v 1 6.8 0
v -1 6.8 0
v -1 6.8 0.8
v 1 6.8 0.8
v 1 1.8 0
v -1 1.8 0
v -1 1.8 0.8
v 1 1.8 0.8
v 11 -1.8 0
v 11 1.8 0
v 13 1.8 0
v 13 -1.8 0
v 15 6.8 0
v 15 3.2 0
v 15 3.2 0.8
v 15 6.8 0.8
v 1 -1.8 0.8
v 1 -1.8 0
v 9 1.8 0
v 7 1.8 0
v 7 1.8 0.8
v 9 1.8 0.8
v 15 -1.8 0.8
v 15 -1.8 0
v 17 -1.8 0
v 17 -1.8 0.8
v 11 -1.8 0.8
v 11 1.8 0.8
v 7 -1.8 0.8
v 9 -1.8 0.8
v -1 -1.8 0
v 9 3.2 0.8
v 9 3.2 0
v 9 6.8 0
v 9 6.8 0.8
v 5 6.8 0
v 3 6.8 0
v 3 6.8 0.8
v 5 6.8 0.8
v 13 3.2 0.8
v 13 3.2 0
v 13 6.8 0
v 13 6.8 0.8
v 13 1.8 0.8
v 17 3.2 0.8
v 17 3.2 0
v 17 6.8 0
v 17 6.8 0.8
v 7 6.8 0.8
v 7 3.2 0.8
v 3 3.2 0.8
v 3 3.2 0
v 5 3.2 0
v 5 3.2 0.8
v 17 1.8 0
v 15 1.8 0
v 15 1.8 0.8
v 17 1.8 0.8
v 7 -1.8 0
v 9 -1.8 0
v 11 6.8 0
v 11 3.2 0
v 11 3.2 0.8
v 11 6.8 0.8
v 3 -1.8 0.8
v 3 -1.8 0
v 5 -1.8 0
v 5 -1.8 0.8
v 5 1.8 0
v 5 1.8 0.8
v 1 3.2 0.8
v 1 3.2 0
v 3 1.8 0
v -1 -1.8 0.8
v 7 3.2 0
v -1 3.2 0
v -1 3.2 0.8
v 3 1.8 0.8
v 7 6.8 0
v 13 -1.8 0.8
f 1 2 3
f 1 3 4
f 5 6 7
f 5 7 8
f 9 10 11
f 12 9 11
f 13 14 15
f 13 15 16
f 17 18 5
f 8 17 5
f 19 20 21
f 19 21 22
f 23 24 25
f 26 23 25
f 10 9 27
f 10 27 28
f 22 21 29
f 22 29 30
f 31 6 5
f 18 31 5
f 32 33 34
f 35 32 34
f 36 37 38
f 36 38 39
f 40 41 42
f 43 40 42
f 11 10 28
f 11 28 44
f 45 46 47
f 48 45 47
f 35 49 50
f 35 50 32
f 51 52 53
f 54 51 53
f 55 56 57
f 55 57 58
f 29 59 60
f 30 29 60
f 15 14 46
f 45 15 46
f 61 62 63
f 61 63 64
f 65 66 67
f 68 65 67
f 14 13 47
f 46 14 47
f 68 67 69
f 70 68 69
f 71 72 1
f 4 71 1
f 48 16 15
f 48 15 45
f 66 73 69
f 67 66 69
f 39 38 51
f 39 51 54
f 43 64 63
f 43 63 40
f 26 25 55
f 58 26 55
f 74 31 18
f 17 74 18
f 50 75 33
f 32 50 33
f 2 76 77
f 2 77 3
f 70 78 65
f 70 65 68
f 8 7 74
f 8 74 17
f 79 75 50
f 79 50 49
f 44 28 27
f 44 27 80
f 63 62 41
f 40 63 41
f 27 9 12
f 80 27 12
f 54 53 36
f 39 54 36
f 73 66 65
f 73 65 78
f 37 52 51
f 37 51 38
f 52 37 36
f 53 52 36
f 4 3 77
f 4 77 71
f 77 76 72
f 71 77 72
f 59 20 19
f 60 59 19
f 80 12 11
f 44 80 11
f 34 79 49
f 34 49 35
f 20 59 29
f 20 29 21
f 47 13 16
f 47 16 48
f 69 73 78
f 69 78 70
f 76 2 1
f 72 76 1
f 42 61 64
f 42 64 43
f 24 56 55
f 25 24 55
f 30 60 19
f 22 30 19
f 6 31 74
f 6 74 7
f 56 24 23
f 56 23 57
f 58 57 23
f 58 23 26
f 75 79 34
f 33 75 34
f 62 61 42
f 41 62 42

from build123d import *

# Parameters (mm, degrees)
SKETCH_1_W         = 2
SKETCH_1_H         = 3.6
EXTRUDE_1_DEPTH    = 0.8
EXTRUDE_1_2_DEPTH  = 0.8
EXTRUDE_1_3_DEPTH  = 0.8
EXTRUDE_1_4_DEPTH  = 0.8
EXTRUDE_1_5_DEPTH  = 0.8
EXTRUDE_1_6_DEPTH  = 0.8
EXTRUDE_1_7_DEPTH  = 0.8
EXTRUDE_1_8_DEPTH  = 0.8
EXTRUDE_1_9_DEPTH  = 0.8
EXTRUDE_1_10_DEPTH = 0.8


with BuildPart() as part:
    # Эскиз1 → Бобышка-Вытянуть1 (new body)
    with BuildSketch(Plane.XY):
        with Locations((4, 0)):
            Rectangle(SKETCH_1_W, SKETCH_1_H)
    extrude(amount=EXTRUDE_1_DEPTH)


with BuildPart() as body_2:
    # Эскиз1 → Extrude 1 2 (new body)
    with BuildSketch(Plane.XY):
        Rectangle(SKETCH_1_W, SKETCH_1_H)
    extrude(amount=EXTRUDE_1_2_DEPTH)


with BuildPart() as body_3:
    # Эскиз1 → Extrude 1 3 (new body)
    with BuildSketch(Plane.XY):
        with Locations((8, 0)):
            Rectangle(SKETCH_1_W, SKETCH_1_H)
    extrude(amount=EXTRUDE_1_3_DEPTH)


with BuildPart() as body_4:
    # Эскиз1 → Extrude 1 4 (new body)
    with BuildSketch(Plane.XY):
        with Locations((12, 0)):
            Rectangle(SKETCH_1_W, SKETCH_1_H)
    extrude(amount=EXTRUDE_1_4_DEPTH)


with BuildPart() as body_5:
    # Эскиз1 → Extrude 1 5 (new body)
    with BuildSketch(Plane.XY):
        with Locations((16, 0)):
            Rectangle(SKETCH_1_W, SKETCH_1_H)
    extrude(amount=EXTRUDE_1_5_DEPTH)


with BuildPart() as body_6:
    # Эскиз1 → Extrude 1 6 (new body)
    with BuildSketch(Plane.XY):
        with Locations((4, 5)):
            Rectangle(SKETCH_1_W, SKETCH_1_H)
    extrude(amount=EXTRUDE_1_6_DEPTH)


with BuildPart() as body_7:
    # Эскиз1 → Extrude 1 7 (new body)
    with BuildSketch(Plane.XY):
        with Locations((8, 5)):
            Rectangle(SKETCH_1_W, SKETCH_1_H)
    extrude(amount=EXTRUDE_1_7_DEPTH)


with BuildPart() as body_8:
    # Эскиз1 → Extrude 1 8 (new body)
    with BuildSketch(Plane.XY):
        with Locations((12, 5)):
            Rectangle(SKETCH_1_W, SKETCH_1_H)
    extrude(amount=EXTRUDE_1_8_DEPTH)


with BuildPart() as body_9:
    # Эскиз1 → Extrude 1 9 (new body)
    with BuildSketch(Plane.XY):
        with Locations((16, 5)):
            Rectangle(SKETCH_1_W, SKETCH_1_H)
    extrude(amount=EXTRUDE_1_9_DEPTH)


with BuildPart() as body_10:
    # Эскиз1 → Extrude 1 10 (new body)
    with BuildSketch(Plane.XY):
        with Locations((0, 5)):
            Rectangle(SKETCH_1_W, SKETCH_1_H)
    extrude(amount=EXTRUDE_1_10_DEPTH)


solid = Compound([part.part, body_2.part, body_3.part, body_4.part, body_5.part, body_6.part, body_7.part, body_8.part, body_9.part, body_10.part])
